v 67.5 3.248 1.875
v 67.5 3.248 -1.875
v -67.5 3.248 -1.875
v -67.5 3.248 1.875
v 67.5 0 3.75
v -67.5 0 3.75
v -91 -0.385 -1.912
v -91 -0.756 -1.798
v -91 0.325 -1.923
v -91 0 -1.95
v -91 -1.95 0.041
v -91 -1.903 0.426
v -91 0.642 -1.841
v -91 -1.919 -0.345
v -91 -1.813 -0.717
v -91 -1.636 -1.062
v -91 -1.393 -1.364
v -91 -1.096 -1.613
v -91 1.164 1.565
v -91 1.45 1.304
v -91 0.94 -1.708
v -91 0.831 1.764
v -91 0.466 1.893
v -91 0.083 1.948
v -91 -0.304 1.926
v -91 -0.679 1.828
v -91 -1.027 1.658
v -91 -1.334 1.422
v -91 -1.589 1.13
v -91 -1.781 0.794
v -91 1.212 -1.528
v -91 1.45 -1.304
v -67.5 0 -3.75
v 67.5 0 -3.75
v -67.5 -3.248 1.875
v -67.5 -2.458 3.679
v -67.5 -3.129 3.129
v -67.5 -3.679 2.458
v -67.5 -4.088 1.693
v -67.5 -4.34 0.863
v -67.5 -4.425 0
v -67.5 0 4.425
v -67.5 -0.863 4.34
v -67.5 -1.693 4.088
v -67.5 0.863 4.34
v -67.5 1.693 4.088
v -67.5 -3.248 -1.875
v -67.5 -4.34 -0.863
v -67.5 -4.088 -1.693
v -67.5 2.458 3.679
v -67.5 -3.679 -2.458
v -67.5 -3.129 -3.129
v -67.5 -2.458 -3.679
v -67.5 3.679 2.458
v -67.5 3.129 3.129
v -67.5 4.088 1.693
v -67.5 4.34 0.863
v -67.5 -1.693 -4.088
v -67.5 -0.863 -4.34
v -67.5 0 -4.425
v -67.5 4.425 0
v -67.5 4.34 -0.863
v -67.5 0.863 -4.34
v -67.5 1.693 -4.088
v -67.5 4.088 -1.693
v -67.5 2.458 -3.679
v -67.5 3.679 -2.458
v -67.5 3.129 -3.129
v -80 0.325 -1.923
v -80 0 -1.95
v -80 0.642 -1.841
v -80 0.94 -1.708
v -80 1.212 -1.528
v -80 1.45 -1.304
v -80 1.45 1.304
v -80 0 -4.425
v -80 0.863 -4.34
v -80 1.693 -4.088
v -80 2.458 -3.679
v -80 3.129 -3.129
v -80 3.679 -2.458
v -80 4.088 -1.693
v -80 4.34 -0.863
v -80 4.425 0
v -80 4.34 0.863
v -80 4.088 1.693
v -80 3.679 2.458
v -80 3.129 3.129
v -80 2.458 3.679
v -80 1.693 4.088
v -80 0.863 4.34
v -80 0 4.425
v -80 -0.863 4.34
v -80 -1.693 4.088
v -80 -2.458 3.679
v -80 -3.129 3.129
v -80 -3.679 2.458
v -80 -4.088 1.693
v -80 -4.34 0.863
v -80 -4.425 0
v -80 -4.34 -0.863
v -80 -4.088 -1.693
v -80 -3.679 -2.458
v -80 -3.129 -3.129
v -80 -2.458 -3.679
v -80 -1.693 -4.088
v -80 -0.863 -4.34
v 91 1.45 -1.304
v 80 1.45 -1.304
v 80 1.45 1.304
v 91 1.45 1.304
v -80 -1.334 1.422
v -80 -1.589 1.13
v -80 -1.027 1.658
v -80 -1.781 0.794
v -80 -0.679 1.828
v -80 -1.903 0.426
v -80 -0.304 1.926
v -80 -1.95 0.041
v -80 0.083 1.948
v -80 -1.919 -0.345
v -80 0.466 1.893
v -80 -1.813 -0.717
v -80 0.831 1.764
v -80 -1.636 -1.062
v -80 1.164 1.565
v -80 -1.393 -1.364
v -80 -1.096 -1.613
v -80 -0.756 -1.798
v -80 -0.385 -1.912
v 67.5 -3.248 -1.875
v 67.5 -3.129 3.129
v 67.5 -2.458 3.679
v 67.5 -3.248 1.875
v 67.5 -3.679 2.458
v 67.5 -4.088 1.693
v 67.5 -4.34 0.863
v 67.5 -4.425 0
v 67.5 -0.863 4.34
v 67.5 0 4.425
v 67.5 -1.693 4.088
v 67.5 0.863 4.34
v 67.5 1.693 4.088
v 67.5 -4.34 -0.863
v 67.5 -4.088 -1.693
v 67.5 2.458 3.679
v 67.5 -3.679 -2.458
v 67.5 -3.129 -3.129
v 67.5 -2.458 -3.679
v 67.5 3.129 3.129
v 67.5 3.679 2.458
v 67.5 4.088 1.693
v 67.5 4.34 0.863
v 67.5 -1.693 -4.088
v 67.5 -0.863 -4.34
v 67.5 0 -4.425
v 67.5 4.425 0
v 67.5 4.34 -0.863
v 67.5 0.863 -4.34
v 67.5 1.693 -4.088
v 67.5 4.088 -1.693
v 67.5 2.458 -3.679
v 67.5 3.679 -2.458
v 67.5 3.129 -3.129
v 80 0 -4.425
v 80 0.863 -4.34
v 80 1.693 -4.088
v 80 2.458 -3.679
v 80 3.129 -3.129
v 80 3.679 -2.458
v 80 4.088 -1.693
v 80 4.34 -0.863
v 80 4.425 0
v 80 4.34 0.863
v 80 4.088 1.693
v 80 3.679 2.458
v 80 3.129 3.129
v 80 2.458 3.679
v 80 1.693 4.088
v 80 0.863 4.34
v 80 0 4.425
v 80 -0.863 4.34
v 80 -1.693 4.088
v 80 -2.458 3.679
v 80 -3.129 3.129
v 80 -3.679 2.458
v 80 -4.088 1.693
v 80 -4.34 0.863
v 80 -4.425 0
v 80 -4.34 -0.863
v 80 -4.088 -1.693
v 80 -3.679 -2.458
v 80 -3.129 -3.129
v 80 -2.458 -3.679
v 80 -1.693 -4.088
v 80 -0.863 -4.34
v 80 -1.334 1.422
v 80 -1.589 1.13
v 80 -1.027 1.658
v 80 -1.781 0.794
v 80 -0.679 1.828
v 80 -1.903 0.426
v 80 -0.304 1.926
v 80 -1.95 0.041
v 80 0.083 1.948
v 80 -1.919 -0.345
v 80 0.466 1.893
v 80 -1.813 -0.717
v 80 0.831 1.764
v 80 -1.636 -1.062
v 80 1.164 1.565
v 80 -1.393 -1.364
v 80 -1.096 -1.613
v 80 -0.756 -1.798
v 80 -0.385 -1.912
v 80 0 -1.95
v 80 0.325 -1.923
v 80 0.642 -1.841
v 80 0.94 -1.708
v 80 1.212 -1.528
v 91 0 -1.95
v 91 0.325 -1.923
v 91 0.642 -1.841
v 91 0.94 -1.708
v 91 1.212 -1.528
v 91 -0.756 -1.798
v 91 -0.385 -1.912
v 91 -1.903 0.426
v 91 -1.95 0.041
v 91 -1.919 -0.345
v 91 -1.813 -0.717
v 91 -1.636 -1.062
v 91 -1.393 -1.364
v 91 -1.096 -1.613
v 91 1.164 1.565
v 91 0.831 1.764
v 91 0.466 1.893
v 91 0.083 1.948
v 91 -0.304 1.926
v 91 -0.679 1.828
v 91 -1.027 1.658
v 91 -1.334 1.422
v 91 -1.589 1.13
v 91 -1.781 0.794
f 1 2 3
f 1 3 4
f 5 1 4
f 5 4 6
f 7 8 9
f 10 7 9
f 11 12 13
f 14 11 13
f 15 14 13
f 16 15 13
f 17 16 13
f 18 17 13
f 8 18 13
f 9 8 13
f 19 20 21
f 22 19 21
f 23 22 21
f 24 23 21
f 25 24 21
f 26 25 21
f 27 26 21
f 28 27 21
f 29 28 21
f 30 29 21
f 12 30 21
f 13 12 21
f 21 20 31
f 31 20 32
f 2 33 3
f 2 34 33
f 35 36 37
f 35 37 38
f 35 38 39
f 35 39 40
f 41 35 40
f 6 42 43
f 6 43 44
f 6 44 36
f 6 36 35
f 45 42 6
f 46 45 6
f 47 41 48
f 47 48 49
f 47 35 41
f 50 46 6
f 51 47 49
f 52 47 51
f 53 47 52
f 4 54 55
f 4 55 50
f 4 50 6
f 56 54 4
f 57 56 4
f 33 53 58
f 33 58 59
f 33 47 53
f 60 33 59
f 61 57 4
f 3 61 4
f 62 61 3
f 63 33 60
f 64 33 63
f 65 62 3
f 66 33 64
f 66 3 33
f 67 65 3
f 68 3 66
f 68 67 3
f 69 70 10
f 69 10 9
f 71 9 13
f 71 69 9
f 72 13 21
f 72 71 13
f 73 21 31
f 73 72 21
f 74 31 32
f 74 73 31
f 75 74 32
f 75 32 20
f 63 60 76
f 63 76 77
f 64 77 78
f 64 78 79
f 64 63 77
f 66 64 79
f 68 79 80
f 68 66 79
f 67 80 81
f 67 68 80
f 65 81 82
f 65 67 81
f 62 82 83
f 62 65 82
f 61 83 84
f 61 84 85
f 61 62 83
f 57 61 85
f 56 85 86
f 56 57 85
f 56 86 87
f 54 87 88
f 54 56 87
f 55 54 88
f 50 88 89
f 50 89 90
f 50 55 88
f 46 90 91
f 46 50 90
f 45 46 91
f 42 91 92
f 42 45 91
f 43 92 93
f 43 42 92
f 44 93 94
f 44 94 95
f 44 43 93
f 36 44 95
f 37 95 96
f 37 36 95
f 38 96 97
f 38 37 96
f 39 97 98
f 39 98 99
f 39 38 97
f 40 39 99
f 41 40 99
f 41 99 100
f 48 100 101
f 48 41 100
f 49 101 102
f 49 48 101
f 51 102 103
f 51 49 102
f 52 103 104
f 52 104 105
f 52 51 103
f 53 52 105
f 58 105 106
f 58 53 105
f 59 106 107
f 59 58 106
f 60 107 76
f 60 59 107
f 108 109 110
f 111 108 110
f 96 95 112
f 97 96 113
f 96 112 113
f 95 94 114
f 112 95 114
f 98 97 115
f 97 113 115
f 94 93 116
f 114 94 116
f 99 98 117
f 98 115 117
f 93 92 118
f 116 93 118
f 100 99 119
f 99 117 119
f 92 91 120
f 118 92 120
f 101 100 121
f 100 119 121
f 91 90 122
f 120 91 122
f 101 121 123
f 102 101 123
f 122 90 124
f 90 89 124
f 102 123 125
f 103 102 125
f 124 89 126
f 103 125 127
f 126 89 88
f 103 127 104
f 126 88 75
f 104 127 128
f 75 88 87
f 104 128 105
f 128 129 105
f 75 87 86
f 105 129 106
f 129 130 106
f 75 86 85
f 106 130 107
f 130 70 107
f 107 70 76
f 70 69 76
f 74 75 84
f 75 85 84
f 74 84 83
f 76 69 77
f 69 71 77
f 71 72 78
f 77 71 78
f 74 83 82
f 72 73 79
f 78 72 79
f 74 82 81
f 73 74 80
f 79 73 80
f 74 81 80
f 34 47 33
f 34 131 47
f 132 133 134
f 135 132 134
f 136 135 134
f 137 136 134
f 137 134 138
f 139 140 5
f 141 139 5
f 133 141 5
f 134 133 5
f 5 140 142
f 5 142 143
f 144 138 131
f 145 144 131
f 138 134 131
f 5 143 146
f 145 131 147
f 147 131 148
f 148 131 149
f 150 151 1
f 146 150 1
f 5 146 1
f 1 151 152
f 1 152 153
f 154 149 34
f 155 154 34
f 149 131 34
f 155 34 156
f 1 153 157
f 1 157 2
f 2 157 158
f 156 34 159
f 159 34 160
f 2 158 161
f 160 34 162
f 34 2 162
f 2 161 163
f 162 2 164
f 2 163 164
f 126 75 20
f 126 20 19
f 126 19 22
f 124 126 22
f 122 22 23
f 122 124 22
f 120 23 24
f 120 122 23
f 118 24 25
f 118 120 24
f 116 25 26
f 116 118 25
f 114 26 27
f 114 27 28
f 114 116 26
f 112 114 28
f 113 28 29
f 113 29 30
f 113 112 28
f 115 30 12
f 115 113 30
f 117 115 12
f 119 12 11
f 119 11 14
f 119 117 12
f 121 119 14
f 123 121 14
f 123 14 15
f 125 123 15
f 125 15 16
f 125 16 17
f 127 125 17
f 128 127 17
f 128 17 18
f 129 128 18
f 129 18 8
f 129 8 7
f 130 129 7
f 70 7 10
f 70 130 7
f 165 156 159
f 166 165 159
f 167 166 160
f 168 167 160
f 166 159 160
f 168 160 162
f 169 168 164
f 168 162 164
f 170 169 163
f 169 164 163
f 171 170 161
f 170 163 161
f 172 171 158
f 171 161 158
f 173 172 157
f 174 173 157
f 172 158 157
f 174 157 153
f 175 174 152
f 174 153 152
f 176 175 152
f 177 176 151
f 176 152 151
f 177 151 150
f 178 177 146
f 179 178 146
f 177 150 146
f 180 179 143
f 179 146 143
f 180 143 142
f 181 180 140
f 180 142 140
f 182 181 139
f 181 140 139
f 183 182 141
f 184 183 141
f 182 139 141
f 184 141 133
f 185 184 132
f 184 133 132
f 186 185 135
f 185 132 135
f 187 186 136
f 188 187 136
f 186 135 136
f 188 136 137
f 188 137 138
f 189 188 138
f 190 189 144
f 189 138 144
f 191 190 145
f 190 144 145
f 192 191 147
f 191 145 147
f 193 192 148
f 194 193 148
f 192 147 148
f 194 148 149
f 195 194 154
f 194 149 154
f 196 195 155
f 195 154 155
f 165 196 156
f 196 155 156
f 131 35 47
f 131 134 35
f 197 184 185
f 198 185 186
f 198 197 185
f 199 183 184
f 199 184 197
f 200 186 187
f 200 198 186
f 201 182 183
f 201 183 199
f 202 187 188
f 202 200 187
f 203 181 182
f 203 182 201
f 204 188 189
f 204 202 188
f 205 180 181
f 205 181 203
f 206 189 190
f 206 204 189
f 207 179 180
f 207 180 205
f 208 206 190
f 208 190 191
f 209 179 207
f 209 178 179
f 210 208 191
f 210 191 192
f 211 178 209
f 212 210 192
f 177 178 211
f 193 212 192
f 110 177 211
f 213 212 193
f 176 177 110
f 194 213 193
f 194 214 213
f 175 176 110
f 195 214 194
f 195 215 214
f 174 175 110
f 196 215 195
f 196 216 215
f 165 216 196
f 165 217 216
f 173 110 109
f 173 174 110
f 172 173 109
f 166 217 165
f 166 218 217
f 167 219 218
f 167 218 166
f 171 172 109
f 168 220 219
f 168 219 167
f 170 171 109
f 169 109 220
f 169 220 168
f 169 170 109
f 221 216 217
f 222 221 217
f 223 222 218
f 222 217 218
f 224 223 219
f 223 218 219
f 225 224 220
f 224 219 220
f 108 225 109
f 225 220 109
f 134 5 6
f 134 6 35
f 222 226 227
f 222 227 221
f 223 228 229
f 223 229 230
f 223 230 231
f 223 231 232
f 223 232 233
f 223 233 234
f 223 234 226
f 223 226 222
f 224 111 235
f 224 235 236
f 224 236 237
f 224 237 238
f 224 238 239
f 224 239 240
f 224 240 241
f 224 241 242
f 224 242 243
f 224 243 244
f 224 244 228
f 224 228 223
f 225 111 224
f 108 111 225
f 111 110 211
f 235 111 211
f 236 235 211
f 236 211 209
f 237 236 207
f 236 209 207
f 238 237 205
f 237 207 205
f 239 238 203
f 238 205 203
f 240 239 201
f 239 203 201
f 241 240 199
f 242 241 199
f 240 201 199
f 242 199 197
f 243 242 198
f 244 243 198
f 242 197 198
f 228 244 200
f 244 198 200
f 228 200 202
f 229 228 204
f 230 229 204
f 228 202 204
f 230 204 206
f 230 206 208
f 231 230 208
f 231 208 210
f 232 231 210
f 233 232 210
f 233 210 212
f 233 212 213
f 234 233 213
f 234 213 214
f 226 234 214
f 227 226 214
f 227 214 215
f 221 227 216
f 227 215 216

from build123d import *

# Parameters (mm, degrees)
BOSS_EXTRUDE1_DEPTH = 67.5
BOSS_EXTRUDE2_START = 67.5
SKETCH1_3_R         = 4.425
BOSS_EXTRUDE2_DEPTH = 12.5
BOSS_EXTRUDE4_DEPTH = 11


with BuildPart() as part:
    # Sketch1 → Boss-Extrude1 (new, symmetric)
    with BuildSketch(Plane(origin=(0, 0, 0), x_dir=(0, 0, -1), z_dir=(1, 0, 0))):
        Polygon((1.875, -3.247595264), (3.75, 0), (1.875, 3.247595264), (-1.875, 3.247595264), (-3.75, 0), (-1.875, -3.247595264), align=None)
    extrude(amount=BOSS_EXTRUDE1_DEPTH, both=True)

    # Sketch1<3> → Boss-Extrude2 (add)
    with BuildSketch(Plane(origin=(0, 0, 0), x_dir=(0, 0, -1), z_dir=(1, 0, 0)).offset(BOSS_EXTRUDE2_START)):
        Circle(SKETCH1_3_R)
    boss_extrude2 = extrude(amount=BOSS_EXTRUDE2_DEPTH)

    # Sketch4 → Boss-Extrude4 (add)
    with BuildSketch(Plane(origin=(80, 0, 0), x_dir=(0, 0, -1), z_dir=(1, 0, 0))):
        with BuildLine():
            Line((1.303840481, 1.45), (-1.303840481, 1.45))
            ThreePointArc((-1.303840481, 1.45), (-0.793728878, -1.78114976), (1.95, 0))
            ThreePointArc((1.95, 0), (1.78114976, 0.793728878), (1.303840481, 1.45))
        make_face()
    boss_extrude4 = extrude(amount=BOSS_EXTRUDE4_DEPTH)

    # Mirror2: Boss-Extrude2, Boss-Extrude4 across plane
    add(boss_extrude2.mirror(Plane(origin=(0, 0, 0), x_dir=(0, 0, 1), z_dir=(1, 0, 0))))
    add(boss_extrude4.mirror(Plane(origin=(0, 0, 0), x_dir=(0, 0, 1), z_dir=(1, 0, 0))))


solid = part.part
